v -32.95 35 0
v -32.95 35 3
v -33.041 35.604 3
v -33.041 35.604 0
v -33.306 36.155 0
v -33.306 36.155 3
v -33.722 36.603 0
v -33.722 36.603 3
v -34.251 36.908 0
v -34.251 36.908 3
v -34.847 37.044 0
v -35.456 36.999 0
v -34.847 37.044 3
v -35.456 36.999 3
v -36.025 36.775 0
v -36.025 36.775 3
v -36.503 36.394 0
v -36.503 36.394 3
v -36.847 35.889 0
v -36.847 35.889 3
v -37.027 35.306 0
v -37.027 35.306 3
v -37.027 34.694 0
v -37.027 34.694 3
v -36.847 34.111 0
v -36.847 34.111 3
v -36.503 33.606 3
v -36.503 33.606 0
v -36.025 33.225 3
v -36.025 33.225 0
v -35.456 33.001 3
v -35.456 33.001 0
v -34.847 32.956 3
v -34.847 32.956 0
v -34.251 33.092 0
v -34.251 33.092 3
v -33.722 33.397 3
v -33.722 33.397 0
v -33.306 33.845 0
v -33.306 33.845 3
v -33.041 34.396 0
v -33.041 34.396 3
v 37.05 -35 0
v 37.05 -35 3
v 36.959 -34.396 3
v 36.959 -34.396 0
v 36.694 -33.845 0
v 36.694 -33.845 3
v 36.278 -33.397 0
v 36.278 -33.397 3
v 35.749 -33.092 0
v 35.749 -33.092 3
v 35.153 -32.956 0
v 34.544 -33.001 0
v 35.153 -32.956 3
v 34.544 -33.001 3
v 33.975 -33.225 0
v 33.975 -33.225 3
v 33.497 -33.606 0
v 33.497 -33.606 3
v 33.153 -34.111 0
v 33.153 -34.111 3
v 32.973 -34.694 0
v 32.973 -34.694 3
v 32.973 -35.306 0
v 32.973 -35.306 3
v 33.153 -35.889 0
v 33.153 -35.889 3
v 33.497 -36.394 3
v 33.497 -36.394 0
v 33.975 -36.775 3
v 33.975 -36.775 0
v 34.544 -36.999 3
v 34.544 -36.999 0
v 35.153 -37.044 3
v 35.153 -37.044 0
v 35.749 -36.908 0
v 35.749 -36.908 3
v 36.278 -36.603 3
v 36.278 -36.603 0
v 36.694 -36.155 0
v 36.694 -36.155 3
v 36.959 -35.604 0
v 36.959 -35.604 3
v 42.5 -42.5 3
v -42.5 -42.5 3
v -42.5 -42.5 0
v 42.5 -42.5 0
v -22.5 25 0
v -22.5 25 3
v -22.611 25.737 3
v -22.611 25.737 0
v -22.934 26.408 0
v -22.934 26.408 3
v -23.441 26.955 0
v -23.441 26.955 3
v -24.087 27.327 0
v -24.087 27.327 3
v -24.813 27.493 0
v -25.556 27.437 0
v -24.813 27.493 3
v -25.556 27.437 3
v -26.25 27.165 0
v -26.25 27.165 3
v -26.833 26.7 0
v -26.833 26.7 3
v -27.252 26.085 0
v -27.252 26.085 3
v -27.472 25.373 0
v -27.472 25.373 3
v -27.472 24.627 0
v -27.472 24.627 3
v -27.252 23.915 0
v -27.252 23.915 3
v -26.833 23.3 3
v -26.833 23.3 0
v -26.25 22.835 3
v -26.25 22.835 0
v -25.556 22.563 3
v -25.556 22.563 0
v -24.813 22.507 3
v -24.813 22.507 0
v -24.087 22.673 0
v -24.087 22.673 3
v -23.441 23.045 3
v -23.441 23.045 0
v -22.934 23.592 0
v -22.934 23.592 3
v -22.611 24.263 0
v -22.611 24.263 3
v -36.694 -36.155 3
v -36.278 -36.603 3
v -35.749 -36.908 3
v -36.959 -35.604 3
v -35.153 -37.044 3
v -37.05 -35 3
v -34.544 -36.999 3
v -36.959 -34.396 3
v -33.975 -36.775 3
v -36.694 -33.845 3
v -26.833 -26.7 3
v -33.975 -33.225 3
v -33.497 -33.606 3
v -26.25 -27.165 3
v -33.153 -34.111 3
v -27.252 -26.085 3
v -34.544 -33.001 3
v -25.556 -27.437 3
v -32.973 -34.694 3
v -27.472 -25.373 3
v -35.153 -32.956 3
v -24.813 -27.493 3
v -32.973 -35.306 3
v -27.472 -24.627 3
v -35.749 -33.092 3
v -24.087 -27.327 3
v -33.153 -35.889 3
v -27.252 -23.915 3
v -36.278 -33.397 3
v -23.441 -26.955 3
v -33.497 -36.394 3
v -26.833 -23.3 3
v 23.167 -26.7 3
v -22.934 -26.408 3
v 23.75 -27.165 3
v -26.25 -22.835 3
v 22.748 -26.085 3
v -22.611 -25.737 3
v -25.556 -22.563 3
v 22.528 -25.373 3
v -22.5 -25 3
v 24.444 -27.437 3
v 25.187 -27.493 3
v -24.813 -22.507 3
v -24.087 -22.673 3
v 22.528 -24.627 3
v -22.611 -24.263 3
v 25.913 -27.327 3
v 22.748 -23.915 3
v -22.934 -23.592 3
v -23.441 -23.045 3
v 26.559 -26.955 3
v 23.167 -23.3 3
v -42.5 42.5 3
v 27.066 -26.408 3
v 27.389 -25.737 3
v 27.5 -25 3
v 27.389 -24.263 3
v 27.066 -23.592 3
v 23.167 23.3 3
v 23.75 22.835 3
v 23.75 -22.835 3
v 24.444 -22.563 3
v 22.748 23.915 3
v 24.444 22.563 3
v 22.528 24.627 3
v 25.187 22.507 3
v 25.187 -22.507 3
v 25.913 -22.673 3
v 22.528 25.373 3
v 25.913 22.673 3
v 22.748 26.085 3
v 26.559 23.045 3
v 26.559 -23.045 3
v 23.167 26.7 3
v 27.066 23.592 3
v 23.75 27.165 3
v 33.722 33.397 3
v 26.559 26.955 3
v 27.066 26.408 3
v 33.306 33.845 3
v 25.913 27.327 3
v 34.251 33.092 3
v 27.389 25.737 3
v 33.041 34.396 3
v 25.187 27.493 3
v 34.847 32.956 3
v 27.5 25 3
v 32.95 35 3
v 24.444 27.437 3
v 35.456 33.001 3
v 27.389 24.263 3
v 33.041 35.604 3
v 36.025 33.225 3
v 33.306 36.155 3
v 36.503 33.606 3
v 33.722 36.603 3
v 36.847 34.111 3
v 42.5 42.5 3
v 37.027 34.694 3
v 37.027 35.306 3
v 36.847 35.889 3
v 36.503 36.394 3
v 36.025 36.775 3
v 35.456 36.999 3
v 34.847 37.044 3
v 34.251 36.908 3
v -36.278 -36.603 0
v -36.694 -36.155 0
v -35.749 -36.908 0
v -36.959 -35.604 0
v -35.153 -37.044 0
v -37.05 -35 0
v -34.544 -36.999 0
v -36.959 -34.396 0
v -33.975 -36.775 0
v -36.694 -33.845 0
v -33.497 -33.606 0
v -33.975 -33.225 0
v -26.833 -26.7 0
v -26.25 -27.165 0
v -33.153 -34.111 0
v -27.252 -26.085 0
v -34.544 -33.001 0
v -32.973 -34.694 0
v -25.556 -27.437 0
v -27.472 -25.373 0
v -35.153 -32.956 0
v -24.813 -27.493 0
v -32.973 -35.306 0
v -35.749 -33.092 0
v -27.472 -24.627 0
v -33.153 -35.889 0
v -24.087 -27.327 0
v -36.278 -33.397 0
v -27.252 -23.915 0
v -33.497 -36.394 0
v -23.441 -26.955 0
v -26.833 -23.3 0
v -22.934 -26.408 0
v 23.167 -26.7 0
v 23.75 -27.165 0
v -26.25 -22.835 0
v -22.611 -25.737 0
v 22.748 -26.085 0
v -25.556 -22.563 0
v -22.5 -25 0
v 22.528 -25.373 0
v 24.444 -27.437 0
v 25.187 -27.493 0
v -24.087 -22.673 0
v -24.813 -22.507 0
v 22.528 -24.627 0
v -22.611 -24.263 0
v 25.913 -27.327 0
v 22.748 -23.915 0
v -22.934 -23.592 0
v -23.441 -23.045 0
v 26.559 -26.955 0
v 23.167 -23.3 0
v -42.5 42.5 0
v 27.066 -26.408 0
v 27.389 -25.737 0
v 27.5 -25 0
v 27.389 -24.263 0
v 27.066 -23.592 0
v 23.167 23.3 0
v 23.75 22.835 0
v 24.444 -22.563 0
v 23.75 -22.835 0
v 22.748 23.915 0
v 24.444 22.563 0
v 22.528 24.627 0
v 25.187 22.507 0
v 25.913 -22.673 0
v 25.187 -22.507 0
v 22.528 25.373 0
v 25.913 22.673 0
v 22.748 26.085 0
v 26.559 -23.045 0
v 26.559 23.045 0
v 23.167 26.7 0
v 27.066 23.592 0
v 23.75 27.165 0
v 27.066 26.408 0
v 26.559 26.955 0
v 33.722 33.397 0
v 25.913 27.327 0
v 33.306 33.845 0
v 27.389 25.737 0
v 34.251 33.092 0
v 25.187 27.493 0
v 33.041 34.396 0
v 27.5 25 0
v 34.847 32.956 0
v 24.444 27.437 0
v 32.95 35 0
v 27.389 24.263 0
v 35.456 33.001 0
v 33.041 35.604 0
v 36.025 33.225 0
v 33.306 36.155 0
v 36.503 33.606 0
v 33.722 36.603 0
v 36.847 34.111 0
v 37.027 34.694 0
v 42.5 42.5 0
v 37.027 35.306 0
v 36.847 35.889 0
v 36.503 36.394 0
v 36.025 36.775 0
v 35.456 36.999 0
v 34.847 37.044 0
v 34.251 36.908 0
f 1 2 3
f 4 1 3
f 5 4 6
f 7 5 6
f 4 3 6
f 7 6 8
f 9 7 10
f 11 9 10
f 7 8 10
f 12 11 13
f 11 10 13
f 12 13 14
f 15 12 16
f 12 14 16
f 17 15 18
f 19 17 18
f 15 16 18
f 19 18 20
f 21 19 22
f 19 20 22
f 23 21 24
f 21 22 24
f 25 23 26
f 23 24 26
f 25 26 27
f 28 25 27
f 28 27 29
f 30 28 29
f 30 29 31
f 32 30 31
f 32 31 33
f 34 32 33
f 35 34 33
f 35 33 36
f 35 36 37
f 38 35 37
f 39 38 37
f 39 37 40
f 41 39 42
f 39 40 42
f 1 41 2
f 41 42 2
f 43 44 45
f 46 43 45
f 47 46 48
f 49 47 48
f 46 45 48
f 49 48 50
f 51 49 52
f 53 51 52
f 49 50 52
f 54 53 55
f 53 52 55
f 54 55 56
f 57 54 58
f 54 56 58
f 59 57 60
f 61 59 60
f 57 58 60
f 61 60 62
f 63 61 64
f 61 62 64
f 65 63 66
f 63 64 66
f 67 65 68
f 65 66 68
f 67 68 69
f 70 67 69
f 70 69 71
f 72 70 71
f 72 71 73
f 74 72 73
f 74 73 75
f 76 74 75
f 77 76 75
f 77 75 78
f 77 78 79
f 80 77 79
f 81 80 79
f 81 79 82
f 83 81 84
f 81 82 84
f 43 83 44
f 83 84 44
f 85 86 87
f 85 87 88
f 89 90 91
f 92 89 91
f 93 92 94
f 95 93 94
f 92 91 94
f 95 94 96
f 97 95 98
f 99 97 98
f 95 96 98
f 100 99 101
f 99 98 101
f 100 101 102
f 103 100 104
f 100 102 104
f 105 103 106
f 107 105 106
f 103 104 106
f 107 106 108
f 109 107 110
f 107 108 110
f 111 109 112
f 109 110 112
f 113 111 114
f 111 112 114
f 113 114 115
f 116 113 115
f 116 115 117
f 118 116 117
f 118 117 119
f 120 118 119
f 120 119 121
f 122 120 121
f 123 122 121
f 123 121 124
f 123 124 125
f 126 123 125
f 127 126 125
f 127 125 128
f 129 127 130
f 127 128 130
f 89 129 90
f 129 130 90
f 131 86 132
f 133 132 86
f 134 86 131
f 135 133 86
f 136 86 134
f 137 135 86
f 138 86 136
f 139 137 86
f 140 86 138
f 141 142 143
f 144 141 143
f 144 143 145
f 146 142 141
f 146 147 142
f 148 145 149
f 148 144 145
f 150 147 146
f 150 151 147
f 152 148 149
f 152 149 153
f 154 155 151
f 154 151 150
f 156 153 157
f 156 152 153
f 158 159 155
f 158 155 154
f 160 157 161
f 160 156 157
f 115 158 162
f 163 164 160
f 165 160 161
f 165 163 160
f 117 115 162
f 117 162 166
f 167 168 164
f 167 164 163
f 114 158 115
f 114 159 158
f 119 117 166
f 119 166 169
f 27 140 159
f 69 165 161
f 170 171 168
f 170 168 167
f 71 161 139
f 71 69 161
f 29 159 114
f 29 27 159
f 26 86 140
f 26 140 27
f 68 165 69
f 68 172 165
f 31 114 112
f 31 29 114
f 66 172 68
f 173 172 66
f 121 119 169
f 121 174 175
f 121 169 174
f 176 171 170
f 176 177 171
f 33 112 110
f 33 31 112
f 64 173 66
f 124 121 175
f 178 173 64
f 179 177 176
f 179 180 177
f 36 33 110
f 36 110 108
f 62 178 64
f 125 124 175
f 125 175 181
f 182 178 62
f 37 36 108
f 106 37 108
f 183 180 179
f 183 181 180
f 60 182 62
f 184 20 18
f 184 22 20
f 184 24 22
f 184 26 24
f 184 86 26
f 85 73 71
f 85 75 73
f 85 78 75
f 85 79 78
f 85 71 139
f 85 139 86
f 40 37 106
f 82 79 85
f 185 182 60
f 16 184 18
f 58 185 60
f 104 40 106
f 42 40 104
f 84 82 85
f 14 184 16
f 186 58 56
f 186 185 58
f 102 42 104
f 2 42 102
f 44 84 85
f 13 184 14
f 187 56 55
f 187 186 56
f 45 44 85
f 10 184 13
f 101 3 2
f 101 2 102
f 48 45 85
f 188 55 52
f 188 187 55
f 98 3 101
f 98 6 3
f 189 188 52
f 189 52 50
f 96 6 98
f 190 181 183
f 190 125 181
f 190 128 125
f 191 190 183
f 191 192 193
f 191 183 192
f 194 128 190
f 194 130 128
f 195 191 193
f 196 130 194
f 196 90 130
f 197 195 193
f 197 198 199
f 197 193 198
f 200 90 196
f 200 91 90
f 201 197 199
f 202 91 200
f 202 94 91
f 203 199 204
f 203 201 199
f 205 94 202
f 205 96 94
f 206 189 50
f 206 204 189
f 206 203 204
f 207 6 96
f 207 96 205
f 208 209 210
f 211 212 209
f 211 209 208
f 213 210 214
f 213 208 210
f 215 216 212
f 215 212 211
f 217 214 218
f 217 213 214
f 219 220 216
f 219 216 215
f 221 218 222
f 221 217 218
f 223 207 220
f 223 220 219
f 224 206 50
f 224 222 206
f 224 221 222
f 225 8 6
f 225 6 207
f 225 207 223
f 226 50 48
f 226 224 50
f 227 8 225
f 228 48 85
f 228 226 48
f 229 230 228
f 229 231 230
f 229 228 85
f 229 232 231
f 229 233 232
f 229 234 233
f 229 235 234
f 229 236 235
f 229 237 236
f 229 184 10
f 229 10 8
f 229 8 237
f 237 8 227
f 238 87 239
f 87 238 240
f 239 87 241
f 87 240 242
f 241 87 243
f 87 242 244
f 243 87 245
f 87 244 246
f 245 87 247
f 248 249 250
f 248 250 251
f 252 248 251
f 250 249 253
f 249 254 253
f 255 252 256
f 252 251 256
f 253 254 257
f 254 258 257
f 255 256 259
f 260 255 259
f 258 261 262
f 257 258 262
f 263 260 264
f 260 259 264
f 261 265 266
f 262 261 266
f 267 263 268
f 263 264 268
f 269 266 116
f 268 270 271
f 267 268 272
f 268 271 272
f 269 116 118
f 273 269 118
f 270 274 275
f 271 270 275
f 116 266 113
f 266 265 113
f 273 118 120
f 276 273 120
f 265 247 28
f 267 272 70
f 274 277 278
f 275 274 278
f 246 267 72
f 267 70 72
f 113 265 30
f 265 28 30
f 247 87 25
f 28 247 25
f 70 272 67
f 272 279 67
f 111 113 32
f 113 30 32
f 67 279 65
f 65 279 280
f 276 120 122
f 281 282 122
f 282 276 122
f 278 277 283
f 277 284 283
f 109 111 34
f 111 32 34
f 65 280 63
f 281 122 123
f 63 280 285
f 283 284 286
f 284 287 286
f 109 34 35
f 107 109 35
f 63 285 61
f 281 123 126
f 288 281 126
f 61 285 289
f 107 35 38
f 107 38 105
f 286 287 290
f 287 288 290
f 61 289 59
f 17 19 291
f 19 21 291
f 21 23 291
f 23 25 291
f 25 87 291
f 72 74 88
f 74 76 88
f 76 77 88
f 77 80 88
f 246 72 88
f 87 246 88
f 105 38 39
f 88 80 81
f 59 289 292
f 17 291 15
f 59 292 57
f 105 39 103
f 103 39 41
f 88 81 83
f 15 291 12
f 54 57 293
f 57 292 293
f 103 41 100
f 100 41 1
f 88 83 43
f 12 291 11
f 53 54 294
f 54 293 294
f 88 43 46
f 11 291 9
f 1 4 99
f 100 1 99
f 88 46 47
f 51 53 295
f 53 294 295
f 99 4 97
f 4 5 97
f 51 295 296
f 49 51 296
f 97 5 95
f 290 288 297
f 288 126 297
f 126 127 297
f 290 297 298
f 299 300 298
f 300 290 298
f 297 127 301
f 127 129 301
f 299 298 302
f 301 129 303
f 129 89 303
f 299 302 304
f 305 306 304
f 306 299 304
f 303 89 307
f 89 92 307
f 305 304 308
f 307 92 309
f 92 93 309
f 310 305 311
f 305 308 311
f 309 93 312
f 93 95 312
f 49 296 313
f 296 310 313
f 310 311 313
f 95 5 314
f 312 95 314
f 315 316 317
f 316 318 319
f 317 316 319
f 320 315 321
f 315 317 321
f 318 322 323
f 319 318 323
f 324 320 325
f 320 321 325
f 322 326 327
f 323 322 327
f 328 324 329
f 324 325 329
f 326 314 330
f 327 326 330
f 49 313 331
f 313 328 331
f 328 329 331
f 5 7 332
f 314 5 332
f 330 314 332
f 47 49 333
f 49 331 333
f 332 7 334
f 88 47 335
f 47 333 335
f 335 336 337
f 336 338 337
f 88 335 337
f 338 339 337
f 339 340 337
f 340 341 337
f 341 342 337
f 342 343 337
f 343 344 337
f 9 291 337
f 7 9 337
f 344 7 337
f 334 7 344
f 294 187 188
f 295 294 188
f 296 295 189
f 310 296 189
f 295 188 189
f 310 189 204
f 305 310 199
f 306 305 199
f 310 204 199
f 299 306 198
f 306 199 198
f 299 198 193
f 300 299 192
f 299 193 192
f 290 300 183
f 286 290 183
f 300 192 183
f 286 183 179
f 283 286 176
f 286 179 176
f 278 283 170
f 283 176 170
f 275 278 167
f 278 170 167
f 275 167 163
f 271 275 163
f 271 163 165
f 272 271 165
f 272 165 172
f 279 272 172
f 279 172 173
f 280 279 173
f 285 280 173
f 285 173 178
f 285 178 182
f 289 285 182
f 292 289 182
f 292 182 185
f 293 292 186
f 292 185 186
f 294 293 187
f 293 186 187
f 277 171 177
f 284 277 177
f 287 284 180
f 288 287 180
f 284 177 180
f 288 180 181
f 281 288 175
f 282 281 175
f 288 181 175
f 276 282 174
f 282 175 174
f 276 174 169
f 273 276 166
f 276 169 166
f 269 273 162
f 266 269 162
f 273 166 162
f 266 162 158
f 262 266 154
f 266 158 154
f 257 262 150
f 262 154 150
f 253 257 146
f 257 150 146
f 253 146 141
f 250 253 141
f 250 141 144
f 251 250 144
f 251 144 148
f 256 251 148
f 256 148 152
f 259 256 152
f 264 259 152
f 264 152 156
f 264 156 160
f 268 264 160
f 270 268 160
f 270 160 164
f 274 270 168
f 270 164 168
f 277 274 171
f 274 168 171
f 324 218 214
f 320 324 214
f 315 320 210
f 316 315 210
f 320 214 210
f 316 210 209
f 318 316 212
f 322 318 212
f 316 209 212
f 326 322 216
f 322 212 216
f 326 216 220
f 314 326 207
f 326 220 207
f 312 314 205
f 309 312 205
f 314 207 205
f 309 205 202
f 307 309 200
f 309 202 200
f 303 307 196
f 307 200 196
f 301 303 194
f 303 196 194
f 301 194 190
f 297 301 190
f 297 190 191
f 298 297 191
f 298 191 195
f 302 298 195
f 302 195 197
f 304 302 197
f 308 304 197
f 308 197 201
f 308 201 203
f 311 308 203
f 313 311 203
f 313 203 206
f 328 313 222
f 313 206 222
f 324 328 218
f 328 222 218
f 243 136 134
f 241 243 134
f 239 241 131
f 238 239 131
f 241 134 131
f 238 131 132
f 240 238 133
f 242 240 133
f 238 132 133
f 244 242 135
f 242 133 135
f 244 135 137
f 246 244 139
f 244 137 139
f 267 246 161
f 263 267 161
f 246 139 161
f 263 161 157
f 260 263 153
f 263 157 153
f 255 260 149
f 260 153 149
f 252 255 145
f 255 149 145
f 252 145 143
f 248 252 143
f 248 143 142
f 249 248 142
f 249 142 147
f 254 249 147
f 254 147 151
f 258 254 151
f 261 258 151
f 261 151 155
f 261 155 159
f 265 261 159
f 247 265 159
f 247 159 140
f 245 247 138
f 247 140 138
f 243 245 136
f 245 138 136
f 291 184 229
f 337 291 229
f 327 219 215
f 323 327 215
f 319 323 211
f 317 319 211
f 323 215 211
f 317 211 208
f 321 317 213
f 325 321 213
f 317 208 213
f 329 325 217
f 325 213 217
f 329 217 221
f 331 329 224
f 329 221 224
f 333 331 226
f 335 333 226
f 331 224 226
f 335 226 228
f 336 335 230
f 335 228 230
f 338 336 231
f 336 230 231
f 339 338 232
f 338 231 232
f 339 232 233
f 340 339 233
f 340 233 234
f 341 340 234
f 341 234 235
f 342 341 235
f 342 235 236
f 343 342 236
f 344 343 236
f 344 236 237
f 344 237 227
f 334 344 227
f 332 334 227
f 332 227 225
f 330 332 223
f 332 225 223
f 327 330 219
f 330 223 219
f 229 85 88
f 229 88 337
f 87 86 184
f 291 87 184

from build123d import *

# Parameters (mm, degrees)
SKETCH1_W           = 65
SKETCH1_H           = 65
SKETCH1_R           = 2.55
BOSS_EXTRUDE1_DEPTH = 3
SKETCH2_W           = 85
SKETCH2_H           = 85
SKETCH2_R           = 2.05
SKETCH2_R_2         = 2.5
BOSS_EXTRUDE2_DEPTH = 3


with BuildPart() as part:
    # Sketch1 → Boss-Extrude1 (new body)
    with BuildSketch(Plane.XY):
        Rectangle(SKETCH1_W, SKETCH1_H)
        with Locations((-25, 25)):
            Circle(SKETCH1_R, mode=Mode.SUBTRACT)
        with Locations((25, 25)):
            Circle(SKETCH1_R, mode=Mode.SUBTRACT)
        with Locations((-25, -25)):
            Circle(SKETCH1_R, mode=Mode.SUBTRACT)
        with Locations((25, -25)):
            Circle(SKETCH1_R, mode=Mode.SUBTRACT)
    extrude(amount=BOSS_EXTRUDE1_DEPTH)

    # Sketch2 → Boss-Extrude2 (add)
    with BuildSketch(Plane.XY.offset(3)):
        Rectangle(SKETCH2_W, SKETCH2_H)
        with Locations((-35, 35)):
            Circle(SKETCH2_R, mode=Mode.SUBTRACT)
        with Locations(Location((35, 35, 0), (0, 0, 180))):
            Circle(SKETCH2_R, mode=Mode.SUBTRACT)
        with Locations((35, -35)):
            Circle(SKETCH2_R, mode=Mode.SUBTRACT)
        with Locations(Location((-35, -35, 0), (0, 0, 180))):
            Circle(SKETCH2_R, mode=Mode.SUBTRACT)
        with Locations((-25, 25)):
            Circle(SKETCH2_R_2, mode=Mode.SUBTRACT)
        with Locations((25, 25)):
            Circle(SKETCH2_R_2, mode=Mode.SUBTRACT)
        with Locations((25, -25)):
            Circle(SKETCH2_R_2, mode=Mode.SUBTRACT)
        with Locations((-25, -25)):
            Circle(SKETCH2_R_2, mode=Mode.SUBTRACT)
    extrude(amount=-BOSS_EXTRUDE2_DEPTH)


solid = part.part
